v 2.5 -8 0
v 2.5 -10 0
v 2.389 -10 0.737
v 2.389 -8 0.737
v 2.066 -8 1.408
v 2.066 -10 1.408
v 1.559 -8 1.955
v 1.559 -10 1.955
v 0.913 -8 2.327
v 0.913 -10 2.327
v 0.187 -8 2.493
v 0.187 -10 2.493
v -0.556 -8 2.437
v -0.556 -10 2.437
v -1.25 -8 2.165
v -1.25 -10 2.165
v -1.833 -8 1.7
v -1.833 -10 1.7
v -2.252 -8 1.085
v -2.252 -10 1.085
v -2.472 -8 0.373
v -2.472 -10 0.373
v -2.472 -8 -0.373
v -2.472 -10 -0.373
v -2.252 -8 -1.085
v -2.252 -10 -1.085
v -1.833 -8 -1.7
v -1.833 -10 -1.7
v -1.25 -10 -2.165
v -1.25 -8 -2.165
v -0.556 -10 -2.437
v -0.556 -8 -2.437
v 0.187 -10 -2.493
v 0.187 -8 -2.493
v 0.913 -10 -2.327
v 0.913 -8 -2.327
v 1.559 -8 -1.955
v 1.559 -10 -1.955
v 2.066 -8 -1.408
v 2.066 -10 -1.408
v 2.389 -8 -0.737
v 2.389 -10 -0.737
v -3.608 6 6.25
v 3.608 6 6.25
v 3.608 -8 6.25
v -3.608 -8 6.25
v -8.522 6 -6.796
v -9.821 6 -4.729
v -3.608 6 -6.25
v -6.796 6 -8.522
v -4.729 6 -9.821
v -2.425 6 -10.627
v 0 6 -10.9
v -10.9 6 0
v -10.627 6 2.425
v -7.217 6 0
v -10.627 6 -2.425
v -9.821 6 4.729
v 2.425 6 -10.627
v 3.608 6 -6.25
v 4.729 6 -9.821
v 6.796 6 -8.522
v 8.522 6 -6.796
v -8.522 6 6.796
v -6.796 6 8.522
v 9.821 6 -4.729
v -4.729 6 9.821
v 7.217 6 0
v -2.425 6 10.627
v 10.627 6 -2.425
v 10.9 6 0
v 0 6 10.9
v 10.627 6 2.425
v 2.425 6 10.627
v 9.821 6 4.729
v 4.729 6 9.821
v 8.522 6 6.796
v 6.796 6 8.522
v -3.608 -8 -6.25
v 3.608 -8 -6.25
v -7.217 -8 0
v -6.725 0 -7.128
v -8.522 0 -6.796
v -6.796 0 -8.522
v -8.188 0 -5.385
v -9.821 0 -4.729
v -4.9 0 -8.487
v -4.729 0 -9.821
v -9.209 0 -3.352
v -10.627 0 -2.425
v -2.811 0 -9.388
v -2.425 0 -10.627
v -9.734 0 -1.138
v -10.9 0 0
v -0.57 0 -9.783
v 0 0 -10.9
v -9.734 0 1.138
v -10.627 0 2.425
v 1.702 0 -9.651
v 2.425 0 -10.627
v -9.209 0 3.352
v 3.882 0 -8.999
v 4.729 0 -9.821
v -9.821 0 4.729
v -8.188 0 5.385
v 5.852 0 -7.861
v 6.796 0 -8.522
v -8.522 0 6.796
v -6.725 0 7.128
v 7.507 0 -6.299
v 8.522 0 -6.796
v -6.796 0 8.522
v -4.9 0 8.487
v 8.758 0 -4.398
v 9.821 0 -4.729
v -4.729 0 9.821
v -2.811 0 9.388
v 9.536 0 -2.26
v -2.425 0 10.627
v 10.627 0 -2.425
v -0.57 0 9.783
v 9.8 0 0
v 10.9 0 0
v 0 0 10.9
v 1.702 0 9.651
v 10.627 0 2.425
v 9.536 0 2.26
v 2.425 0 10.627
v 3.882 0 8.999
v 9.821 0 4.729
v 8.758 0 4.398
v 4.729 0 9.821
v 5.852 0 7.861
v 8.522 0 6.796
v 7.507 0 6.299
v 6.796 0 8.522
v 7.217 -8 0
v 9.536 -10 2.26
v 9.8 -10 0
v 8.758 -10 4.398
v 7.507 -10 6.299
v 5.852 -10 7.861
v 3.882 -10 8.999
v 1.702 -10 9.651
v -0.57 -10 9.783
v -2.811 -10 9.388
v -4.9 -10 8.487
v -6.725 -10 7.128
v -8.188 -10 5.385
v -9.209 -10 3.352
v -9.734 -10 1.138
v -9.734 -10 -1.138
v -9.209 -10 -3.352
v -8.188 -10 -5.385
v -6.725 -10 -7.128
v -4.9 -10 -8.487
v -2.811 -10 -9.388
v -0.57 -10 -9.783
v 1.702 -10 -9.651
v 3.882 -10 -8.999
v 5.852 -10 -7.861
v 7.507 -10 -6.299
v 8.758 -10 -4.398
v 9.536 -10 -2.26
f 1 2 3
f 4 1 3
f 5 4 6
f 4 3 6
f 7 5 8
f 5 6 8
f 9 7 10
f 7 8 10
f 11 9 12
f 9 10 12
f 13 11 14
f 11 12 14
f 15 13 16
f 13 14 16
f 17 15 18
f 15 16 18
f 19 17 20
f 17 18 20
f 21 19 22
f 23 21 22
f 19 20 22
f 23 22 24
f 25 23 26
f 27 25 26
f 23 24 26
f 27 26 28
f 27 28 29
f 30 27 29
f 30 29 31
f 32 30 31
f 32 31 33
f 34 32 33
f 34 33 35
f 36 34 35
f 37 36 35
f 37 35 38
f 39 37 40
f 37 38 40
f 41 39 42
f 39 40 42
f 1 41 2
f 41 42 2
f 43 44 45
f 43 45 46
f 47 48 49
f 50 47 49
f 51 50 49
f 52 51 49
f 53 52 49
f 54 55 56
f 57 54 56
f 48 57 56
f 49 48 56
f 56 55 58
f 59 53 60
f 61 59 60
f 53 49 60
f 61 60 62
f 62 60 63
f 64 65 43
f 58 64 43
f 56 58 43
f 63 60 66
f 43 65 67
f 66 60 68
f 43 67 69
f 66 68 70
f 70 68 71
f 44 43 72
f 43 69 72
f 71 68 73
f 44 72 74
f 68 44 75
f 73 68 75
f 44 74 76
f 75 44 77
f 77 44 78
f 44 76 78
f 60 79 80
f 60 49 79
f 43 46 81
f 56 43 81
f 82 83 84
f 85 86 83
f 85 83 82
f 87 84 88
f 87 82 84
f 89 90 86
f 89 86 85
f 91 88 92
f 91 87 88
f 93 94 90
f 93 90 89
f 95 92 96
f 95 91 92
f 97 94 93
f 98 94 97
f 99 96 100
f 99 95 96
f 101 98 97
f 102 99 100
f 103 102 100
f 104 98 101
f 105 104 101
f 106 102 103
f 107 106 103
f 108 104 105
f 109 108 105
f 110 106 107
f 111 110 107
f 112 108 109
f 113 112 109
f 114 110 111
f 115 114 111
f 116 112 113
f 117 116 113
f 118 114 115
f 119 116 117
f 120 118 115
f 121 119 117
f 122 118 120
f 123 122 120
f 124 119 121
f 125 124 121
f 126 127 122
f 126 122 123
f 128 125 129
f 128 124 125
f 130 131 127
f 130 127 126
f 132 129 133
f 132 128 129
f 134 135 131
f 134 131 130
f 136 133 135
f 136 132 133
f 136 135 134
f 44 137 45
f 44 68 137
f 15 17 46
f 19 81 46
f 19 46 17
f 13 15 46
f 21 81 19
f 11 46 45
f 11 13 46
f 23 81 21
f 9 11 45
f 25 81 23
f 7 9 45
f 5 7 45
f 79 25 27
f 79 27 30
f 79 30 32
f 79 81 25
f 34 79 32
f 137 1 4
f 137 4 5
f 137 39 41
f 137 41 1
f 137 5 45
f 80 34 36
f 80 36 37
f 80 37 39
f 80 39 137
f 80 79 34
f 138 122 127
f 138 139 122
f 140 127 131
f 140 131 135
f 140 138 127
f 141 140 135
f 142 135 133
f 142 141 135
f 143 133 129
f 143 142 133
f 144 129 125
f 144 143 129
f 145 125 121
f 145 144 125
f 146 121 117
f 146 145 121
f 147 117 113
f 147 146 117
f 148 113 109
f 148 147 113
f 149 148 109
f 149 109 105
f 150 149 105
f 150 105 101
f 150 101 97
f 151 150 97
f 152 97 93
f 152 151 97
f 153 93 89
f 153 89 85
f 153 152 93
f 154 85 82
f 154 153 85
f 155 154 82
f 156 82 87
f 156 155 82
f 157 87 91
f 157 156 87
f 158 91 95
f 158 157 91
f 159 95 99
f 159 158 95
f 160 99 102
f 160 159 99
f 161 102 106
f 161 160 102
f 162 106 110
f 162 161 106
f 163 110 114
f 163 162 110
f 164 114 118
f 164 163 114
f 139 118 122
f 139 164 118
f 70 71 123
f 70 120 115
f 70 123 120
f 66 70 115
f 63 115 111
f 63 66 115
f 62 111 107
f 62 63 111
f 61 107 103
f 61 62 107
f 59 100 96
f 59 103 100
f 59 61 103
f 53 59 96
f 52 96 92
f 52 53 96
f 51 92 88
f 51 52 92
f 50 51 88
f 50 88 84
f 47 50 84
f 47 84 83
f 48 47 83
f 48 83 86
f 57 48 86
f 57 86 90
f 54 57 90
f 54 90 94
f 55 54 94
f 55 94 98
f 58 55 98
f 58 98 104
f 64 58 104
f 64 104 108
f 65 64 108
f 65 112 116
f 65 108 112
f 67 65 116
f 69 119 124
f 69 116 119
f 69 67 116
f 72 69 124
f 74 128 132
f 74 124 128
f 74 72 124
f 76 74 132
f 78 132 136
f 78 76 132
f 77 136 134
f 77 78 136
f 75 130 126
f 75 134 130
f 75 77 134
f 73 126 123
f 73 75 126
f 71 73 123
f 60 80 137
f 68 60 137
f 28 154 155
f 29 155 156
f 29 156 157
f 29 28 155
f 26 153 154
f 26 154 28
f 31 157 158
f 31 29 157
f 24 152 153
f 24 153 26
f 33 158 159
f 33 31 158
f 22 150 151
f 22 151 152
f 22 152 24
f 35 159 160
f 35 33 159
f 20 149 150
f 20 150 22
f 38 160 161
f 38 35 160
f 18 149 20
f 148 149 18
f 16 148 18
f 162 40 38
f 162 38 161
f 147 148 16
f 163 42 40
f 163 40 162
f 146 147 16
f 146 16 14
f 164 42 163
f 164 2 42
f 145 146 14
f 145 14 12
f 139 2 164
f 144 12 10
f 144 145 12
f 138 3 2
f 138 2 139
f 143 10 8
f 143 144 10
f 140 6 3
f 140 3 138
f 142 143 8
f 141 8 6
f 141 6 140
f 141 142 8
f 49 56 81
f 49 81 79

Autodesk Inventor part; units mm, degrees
ref_plane "YZ Plane" through (0, 0, 0) normal (1, 0, 0) x (0, 1, 0)
ref_plane "XZ Plane" through (0, 0, 0) normal (0, 1, 0) x (-1, 0, 0)
ref_plane "XY Plane" through (0, 0, 0) normal (0, 0, 1) x (1, 0, 0)
sketch "Sketch2" plane through (0, 0, 0) normal (0, 0, 1) x (1, 0, 0)
  line L0 (0, 0) -> (10.9, 0)
  line L1 (10.9, 0) -> (10.9, 6)
  line L2 (10.9, 6) -> (0, 6)
  line L3 (0, 6) -> (0, 0)
  line L4 (0, 0) -> (9.8, 0)
  line L5 (9.8, 0) -> (9.8, -10)
  line L6 (9.8, -10) -> (0, -10)
  line L7 (0, -10) -> (0, 0)
  dimension "d1" = 10.9
  dimension "d2" = 6
  dimension "d3" = 9.8
  dimension "d4" = 10
revolve "Revolution1" add sketch "Sketch2" angle 360 about axis through (0, 6, 0) along (0, -1, 0)
sketch "Sketch5" plane through (0, 6, 0) normal (0, 1, 0) x (1, 0, 0)
  line L0 (3.6084, 6.25) -> (7.2169, 0)
  line L1 (7.2169, 0) -> (3.6084, -6.25)
  line L2 (3.6084, -6.25) -> (-3.6084, -6.25)
  line L3 (-3.6084, -6.25) -> (-7.2169, 0)
  line L4 (-7.2169, 0) -> (-3.6084, 6.25)
  line L5 (-3.6084, 6.25) -> (3.6084, 6.25)
  point P0 (0, 0)
  point P1 (0, 0)
  dimension "d16" = 12.5
extrude "Extrusion2" cut sketch "Sketch5" against normal blind 14
sketch "Sketch6" plane through (0, -10, 0) normal (0, -1, 0) x (1, 0, 0)
  circle A0 centre (0, 0) radius 2.5
  point P0 (0, 0)
  dimension "d19" = 5
extrude "Extrusion3" cut sketch "Sketch6" against normal through all
properties part number "WHEEL_ADAPTER"
